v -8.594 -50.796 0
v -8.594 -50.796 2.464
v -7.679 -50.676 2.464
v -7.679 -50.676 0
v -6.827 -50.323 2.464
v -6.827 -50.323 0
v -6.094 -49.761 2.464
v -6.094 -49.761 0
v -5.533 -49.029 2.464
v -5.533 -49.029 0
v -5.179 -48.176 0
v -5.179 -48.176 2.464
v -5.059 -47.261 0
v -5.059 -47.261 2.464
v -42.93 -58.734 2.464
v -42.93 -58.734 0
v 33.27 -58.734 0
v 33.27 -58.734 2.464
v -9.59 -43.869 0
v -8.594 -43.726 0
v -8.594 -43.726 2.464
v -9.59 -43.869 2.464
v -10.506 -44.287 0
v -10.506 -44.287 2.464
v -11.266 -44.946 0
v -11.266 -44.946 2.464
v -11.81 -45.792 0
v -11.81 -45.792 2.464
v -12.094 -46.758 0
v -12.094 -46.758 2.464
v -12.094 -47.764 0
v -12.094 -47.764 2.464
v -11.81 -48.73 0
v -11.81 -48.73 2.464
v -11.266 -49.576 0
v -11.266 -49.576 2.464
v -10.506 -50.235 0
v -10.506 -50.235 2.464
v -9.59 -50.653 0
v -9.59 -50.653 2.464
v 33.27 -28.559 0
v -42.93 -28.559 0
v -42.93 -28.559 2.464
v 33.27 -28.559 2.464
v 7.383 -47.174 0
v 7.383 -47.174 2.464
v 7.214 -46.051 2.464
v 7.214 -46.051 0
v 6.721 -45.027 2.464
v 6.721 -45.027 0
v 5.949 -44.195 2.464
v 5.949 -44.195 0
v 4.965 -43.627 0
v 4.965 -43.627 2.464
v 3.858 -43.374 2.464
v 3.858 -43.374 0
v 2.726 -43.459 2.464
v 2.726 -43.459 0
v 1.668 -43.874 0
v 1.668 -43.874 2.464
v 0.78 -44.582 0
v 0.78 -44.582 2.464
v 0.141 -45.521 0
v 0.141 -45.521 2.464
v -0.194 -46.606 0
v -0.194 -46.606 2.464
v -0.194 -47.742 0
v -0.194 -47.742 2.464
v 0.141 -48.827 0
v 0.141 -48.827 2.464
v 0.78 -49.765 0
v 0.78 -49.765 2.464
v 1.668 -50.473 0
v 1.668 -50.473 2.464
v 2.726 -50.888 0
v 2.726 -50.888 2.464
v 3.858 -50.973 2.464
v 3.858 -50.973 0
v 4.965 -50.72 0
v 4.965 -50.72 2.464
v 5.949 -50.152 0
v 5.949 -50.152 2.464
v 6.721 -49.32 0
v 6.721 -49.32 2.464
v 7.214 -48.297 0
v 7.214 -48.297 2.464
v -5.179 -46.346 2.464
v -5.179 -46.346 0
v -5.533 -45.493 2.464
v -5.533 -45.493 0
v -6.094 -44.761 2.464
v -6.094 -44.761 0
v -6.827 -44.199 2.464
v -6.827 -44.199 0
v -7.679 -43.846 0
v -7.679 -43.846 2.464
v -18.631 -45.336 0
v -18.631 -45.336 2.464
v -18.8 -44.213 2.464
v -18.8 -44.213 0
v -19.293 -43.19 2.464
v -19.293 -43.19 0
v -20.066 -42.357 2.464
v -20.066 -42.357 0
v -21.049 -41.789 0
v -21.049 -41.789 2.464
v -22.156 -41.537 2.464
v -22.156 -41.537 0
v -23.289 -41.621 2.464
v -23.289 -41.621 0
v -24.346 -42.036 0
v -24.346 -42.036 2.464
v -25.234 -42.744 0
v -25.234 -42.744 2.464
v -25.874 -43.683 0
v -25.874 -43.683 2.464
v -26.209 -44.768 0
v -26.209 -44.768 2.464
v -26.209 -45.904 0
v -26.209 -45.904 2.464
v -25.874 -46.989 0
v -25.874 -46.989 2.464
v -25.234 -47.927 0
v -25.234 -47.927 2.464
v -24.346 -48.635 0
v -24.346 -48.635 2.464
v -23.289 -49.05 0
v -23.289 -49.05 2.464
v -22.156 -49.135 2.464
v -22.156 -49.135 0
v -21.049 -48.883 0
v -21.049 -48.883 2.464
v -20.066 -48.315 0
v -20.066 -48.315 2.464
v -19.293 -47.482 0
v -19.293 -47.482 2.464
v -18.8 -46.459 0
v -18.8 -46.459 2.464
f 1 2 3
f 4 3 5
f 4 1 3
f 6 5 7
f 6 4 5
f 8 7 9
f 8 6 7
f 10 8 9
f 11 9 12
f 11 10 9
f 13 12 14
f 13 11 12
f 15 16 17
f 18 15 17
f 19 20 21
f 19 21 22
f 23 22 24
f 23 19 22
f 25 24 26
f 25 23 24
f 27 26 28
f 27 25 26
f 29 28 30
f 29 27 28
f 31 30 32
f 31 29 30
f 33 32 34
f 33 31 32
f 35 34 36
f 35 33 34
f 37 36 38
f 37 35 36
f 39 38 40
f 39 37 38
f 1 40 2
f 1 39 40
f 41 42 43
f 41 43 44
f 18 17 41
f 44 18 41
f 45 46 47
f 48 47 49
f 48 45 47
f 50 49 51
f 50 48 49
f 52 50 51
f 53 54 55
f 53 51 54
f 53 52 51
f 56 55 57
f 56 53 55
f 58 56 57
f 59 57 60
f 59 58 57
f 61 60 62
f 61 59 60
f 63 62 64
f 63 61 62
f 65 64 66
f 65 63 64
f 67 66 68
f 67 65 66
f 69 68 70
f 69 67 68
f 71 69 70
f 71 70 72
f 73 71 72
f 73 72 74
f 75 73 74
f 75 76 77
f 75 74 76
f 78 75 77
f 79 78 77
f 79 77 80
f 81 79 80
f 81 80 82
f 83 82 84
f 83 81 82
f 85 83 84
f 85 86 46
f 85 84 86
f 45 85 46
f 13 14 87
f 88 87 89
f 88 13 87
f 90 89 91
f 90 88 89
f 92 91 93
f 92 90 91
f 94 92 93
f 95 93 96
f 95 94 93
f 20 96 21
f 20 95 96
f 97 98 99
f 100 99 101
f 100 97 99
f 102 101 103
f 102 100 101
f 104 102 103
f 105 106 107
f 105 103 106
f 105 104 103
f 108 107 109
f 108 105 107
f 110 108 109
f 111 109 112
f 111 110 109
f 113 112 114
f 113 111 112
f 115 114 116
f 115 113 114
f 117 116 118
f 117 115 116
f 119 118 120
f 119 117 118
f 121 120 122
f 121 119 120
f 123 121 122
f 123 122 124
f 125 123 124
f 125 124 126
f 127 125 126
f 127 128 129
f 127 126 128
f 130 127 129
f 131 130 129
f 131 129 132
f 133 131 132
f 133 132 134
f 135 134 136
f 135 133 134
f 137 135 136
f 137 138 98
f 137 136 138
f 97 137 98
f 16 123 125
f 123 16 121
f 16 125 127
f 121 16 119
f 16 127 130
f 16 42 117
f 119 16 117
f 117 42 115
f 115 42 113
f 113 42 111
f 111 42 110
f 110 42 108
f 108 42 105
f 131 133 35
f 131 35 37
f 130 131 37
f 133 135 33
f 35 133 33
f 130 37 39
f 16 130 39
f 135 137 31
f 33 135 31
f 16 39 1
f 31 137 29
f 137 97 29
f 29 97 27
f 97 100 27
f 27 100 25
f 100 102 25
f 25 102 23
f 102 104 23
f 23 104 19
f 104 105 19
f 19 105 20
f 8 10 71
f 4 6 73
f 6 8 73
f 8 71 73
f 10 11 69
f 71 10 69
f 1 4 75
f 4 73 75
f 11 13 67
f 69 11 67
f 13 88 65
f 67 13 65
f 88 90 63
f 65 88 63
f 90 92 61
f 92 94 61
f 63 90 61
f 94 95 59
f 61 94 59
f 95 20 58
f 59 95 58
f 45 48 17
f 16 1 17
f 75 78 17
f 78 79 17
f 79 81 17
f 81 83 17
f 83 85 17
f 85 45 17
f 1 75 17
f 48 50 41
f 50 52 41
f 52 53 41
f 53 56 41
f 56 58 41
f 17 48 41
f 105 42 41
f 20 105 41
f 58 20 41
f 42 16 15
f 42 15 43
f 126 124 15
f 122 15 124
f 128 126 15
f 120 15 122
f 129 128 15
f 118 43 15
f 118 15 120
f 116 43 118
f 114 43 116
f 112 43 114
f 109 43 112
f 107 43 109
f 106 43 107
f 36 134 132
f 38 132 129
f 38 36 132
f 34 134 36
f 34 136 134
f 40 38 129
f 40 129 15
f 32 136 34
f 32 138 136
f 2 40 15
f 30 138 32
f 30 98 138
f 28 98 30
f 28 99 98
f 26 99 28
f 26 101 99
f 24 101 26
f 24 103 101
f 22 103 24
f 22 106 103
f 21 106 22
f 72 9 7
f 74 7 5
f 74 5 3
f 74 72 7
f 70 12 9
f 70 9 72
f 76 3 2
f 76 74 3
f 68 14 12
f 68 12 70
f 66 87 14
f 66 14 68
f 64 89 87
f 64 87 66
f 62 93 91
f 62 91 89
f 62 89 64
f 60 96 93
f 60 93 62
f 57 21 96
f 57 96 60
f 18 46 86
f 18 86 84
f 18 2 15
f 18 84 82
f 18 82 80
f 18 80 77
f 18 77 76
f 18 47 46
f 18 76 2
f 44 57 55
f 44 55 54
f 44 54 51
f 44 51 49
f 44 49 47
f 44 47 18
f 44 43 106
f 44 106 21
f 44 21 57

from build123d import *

# Parameters (mm, degrees)
F0_W     = 76.2
F0_H     = 30.1752
F1_DEPTH = 2.4638
F2_R     = 3.81
F3_DEPTH = 20.32


with BuildPart() as f1:
    # F0 (on Top) → F1 (new body)
    with BuildSketch(Plane.XY):
        with Locations((-4.829727, -43.646489)):
            Rectangle(F0_W, F0_H)
    extrude(amount=F1_DEPTH)

    # F2 (on Top) → F3 (cut)
    with BuildSketch(Plane.XY):
        with Locations((-22.441126, -45.335913)):
            Circle(F2_R)
        with BuildLine():
            ThreePointArc((-8.594292, -50.796484), (-6.094356, -49.760976), (-5.058848, -47.26104))
            ThreePointArc((-5.058848, -47.26104), (-6.094356, -44.761104), (-8.594292, -43.725596))
            Line((-8.594292, -43.725596), (-8.594292, -50.796484))
        make_face()
        with BuildLine():
            Line((-8.594292, -50.796484), (-8.594292, -43.725596))
            ThreePointArc((-8.594292, -43.725596), (-12.129736, -47.26104), (-8.594292, -50.796484))
        make_face()
        with Locations((3.573384, -47.173662)):
            Circle(F2_R)
    extrude(amount=F3_DEPTH, mode=Mode.SUBTRACT)


solid = f1.part
